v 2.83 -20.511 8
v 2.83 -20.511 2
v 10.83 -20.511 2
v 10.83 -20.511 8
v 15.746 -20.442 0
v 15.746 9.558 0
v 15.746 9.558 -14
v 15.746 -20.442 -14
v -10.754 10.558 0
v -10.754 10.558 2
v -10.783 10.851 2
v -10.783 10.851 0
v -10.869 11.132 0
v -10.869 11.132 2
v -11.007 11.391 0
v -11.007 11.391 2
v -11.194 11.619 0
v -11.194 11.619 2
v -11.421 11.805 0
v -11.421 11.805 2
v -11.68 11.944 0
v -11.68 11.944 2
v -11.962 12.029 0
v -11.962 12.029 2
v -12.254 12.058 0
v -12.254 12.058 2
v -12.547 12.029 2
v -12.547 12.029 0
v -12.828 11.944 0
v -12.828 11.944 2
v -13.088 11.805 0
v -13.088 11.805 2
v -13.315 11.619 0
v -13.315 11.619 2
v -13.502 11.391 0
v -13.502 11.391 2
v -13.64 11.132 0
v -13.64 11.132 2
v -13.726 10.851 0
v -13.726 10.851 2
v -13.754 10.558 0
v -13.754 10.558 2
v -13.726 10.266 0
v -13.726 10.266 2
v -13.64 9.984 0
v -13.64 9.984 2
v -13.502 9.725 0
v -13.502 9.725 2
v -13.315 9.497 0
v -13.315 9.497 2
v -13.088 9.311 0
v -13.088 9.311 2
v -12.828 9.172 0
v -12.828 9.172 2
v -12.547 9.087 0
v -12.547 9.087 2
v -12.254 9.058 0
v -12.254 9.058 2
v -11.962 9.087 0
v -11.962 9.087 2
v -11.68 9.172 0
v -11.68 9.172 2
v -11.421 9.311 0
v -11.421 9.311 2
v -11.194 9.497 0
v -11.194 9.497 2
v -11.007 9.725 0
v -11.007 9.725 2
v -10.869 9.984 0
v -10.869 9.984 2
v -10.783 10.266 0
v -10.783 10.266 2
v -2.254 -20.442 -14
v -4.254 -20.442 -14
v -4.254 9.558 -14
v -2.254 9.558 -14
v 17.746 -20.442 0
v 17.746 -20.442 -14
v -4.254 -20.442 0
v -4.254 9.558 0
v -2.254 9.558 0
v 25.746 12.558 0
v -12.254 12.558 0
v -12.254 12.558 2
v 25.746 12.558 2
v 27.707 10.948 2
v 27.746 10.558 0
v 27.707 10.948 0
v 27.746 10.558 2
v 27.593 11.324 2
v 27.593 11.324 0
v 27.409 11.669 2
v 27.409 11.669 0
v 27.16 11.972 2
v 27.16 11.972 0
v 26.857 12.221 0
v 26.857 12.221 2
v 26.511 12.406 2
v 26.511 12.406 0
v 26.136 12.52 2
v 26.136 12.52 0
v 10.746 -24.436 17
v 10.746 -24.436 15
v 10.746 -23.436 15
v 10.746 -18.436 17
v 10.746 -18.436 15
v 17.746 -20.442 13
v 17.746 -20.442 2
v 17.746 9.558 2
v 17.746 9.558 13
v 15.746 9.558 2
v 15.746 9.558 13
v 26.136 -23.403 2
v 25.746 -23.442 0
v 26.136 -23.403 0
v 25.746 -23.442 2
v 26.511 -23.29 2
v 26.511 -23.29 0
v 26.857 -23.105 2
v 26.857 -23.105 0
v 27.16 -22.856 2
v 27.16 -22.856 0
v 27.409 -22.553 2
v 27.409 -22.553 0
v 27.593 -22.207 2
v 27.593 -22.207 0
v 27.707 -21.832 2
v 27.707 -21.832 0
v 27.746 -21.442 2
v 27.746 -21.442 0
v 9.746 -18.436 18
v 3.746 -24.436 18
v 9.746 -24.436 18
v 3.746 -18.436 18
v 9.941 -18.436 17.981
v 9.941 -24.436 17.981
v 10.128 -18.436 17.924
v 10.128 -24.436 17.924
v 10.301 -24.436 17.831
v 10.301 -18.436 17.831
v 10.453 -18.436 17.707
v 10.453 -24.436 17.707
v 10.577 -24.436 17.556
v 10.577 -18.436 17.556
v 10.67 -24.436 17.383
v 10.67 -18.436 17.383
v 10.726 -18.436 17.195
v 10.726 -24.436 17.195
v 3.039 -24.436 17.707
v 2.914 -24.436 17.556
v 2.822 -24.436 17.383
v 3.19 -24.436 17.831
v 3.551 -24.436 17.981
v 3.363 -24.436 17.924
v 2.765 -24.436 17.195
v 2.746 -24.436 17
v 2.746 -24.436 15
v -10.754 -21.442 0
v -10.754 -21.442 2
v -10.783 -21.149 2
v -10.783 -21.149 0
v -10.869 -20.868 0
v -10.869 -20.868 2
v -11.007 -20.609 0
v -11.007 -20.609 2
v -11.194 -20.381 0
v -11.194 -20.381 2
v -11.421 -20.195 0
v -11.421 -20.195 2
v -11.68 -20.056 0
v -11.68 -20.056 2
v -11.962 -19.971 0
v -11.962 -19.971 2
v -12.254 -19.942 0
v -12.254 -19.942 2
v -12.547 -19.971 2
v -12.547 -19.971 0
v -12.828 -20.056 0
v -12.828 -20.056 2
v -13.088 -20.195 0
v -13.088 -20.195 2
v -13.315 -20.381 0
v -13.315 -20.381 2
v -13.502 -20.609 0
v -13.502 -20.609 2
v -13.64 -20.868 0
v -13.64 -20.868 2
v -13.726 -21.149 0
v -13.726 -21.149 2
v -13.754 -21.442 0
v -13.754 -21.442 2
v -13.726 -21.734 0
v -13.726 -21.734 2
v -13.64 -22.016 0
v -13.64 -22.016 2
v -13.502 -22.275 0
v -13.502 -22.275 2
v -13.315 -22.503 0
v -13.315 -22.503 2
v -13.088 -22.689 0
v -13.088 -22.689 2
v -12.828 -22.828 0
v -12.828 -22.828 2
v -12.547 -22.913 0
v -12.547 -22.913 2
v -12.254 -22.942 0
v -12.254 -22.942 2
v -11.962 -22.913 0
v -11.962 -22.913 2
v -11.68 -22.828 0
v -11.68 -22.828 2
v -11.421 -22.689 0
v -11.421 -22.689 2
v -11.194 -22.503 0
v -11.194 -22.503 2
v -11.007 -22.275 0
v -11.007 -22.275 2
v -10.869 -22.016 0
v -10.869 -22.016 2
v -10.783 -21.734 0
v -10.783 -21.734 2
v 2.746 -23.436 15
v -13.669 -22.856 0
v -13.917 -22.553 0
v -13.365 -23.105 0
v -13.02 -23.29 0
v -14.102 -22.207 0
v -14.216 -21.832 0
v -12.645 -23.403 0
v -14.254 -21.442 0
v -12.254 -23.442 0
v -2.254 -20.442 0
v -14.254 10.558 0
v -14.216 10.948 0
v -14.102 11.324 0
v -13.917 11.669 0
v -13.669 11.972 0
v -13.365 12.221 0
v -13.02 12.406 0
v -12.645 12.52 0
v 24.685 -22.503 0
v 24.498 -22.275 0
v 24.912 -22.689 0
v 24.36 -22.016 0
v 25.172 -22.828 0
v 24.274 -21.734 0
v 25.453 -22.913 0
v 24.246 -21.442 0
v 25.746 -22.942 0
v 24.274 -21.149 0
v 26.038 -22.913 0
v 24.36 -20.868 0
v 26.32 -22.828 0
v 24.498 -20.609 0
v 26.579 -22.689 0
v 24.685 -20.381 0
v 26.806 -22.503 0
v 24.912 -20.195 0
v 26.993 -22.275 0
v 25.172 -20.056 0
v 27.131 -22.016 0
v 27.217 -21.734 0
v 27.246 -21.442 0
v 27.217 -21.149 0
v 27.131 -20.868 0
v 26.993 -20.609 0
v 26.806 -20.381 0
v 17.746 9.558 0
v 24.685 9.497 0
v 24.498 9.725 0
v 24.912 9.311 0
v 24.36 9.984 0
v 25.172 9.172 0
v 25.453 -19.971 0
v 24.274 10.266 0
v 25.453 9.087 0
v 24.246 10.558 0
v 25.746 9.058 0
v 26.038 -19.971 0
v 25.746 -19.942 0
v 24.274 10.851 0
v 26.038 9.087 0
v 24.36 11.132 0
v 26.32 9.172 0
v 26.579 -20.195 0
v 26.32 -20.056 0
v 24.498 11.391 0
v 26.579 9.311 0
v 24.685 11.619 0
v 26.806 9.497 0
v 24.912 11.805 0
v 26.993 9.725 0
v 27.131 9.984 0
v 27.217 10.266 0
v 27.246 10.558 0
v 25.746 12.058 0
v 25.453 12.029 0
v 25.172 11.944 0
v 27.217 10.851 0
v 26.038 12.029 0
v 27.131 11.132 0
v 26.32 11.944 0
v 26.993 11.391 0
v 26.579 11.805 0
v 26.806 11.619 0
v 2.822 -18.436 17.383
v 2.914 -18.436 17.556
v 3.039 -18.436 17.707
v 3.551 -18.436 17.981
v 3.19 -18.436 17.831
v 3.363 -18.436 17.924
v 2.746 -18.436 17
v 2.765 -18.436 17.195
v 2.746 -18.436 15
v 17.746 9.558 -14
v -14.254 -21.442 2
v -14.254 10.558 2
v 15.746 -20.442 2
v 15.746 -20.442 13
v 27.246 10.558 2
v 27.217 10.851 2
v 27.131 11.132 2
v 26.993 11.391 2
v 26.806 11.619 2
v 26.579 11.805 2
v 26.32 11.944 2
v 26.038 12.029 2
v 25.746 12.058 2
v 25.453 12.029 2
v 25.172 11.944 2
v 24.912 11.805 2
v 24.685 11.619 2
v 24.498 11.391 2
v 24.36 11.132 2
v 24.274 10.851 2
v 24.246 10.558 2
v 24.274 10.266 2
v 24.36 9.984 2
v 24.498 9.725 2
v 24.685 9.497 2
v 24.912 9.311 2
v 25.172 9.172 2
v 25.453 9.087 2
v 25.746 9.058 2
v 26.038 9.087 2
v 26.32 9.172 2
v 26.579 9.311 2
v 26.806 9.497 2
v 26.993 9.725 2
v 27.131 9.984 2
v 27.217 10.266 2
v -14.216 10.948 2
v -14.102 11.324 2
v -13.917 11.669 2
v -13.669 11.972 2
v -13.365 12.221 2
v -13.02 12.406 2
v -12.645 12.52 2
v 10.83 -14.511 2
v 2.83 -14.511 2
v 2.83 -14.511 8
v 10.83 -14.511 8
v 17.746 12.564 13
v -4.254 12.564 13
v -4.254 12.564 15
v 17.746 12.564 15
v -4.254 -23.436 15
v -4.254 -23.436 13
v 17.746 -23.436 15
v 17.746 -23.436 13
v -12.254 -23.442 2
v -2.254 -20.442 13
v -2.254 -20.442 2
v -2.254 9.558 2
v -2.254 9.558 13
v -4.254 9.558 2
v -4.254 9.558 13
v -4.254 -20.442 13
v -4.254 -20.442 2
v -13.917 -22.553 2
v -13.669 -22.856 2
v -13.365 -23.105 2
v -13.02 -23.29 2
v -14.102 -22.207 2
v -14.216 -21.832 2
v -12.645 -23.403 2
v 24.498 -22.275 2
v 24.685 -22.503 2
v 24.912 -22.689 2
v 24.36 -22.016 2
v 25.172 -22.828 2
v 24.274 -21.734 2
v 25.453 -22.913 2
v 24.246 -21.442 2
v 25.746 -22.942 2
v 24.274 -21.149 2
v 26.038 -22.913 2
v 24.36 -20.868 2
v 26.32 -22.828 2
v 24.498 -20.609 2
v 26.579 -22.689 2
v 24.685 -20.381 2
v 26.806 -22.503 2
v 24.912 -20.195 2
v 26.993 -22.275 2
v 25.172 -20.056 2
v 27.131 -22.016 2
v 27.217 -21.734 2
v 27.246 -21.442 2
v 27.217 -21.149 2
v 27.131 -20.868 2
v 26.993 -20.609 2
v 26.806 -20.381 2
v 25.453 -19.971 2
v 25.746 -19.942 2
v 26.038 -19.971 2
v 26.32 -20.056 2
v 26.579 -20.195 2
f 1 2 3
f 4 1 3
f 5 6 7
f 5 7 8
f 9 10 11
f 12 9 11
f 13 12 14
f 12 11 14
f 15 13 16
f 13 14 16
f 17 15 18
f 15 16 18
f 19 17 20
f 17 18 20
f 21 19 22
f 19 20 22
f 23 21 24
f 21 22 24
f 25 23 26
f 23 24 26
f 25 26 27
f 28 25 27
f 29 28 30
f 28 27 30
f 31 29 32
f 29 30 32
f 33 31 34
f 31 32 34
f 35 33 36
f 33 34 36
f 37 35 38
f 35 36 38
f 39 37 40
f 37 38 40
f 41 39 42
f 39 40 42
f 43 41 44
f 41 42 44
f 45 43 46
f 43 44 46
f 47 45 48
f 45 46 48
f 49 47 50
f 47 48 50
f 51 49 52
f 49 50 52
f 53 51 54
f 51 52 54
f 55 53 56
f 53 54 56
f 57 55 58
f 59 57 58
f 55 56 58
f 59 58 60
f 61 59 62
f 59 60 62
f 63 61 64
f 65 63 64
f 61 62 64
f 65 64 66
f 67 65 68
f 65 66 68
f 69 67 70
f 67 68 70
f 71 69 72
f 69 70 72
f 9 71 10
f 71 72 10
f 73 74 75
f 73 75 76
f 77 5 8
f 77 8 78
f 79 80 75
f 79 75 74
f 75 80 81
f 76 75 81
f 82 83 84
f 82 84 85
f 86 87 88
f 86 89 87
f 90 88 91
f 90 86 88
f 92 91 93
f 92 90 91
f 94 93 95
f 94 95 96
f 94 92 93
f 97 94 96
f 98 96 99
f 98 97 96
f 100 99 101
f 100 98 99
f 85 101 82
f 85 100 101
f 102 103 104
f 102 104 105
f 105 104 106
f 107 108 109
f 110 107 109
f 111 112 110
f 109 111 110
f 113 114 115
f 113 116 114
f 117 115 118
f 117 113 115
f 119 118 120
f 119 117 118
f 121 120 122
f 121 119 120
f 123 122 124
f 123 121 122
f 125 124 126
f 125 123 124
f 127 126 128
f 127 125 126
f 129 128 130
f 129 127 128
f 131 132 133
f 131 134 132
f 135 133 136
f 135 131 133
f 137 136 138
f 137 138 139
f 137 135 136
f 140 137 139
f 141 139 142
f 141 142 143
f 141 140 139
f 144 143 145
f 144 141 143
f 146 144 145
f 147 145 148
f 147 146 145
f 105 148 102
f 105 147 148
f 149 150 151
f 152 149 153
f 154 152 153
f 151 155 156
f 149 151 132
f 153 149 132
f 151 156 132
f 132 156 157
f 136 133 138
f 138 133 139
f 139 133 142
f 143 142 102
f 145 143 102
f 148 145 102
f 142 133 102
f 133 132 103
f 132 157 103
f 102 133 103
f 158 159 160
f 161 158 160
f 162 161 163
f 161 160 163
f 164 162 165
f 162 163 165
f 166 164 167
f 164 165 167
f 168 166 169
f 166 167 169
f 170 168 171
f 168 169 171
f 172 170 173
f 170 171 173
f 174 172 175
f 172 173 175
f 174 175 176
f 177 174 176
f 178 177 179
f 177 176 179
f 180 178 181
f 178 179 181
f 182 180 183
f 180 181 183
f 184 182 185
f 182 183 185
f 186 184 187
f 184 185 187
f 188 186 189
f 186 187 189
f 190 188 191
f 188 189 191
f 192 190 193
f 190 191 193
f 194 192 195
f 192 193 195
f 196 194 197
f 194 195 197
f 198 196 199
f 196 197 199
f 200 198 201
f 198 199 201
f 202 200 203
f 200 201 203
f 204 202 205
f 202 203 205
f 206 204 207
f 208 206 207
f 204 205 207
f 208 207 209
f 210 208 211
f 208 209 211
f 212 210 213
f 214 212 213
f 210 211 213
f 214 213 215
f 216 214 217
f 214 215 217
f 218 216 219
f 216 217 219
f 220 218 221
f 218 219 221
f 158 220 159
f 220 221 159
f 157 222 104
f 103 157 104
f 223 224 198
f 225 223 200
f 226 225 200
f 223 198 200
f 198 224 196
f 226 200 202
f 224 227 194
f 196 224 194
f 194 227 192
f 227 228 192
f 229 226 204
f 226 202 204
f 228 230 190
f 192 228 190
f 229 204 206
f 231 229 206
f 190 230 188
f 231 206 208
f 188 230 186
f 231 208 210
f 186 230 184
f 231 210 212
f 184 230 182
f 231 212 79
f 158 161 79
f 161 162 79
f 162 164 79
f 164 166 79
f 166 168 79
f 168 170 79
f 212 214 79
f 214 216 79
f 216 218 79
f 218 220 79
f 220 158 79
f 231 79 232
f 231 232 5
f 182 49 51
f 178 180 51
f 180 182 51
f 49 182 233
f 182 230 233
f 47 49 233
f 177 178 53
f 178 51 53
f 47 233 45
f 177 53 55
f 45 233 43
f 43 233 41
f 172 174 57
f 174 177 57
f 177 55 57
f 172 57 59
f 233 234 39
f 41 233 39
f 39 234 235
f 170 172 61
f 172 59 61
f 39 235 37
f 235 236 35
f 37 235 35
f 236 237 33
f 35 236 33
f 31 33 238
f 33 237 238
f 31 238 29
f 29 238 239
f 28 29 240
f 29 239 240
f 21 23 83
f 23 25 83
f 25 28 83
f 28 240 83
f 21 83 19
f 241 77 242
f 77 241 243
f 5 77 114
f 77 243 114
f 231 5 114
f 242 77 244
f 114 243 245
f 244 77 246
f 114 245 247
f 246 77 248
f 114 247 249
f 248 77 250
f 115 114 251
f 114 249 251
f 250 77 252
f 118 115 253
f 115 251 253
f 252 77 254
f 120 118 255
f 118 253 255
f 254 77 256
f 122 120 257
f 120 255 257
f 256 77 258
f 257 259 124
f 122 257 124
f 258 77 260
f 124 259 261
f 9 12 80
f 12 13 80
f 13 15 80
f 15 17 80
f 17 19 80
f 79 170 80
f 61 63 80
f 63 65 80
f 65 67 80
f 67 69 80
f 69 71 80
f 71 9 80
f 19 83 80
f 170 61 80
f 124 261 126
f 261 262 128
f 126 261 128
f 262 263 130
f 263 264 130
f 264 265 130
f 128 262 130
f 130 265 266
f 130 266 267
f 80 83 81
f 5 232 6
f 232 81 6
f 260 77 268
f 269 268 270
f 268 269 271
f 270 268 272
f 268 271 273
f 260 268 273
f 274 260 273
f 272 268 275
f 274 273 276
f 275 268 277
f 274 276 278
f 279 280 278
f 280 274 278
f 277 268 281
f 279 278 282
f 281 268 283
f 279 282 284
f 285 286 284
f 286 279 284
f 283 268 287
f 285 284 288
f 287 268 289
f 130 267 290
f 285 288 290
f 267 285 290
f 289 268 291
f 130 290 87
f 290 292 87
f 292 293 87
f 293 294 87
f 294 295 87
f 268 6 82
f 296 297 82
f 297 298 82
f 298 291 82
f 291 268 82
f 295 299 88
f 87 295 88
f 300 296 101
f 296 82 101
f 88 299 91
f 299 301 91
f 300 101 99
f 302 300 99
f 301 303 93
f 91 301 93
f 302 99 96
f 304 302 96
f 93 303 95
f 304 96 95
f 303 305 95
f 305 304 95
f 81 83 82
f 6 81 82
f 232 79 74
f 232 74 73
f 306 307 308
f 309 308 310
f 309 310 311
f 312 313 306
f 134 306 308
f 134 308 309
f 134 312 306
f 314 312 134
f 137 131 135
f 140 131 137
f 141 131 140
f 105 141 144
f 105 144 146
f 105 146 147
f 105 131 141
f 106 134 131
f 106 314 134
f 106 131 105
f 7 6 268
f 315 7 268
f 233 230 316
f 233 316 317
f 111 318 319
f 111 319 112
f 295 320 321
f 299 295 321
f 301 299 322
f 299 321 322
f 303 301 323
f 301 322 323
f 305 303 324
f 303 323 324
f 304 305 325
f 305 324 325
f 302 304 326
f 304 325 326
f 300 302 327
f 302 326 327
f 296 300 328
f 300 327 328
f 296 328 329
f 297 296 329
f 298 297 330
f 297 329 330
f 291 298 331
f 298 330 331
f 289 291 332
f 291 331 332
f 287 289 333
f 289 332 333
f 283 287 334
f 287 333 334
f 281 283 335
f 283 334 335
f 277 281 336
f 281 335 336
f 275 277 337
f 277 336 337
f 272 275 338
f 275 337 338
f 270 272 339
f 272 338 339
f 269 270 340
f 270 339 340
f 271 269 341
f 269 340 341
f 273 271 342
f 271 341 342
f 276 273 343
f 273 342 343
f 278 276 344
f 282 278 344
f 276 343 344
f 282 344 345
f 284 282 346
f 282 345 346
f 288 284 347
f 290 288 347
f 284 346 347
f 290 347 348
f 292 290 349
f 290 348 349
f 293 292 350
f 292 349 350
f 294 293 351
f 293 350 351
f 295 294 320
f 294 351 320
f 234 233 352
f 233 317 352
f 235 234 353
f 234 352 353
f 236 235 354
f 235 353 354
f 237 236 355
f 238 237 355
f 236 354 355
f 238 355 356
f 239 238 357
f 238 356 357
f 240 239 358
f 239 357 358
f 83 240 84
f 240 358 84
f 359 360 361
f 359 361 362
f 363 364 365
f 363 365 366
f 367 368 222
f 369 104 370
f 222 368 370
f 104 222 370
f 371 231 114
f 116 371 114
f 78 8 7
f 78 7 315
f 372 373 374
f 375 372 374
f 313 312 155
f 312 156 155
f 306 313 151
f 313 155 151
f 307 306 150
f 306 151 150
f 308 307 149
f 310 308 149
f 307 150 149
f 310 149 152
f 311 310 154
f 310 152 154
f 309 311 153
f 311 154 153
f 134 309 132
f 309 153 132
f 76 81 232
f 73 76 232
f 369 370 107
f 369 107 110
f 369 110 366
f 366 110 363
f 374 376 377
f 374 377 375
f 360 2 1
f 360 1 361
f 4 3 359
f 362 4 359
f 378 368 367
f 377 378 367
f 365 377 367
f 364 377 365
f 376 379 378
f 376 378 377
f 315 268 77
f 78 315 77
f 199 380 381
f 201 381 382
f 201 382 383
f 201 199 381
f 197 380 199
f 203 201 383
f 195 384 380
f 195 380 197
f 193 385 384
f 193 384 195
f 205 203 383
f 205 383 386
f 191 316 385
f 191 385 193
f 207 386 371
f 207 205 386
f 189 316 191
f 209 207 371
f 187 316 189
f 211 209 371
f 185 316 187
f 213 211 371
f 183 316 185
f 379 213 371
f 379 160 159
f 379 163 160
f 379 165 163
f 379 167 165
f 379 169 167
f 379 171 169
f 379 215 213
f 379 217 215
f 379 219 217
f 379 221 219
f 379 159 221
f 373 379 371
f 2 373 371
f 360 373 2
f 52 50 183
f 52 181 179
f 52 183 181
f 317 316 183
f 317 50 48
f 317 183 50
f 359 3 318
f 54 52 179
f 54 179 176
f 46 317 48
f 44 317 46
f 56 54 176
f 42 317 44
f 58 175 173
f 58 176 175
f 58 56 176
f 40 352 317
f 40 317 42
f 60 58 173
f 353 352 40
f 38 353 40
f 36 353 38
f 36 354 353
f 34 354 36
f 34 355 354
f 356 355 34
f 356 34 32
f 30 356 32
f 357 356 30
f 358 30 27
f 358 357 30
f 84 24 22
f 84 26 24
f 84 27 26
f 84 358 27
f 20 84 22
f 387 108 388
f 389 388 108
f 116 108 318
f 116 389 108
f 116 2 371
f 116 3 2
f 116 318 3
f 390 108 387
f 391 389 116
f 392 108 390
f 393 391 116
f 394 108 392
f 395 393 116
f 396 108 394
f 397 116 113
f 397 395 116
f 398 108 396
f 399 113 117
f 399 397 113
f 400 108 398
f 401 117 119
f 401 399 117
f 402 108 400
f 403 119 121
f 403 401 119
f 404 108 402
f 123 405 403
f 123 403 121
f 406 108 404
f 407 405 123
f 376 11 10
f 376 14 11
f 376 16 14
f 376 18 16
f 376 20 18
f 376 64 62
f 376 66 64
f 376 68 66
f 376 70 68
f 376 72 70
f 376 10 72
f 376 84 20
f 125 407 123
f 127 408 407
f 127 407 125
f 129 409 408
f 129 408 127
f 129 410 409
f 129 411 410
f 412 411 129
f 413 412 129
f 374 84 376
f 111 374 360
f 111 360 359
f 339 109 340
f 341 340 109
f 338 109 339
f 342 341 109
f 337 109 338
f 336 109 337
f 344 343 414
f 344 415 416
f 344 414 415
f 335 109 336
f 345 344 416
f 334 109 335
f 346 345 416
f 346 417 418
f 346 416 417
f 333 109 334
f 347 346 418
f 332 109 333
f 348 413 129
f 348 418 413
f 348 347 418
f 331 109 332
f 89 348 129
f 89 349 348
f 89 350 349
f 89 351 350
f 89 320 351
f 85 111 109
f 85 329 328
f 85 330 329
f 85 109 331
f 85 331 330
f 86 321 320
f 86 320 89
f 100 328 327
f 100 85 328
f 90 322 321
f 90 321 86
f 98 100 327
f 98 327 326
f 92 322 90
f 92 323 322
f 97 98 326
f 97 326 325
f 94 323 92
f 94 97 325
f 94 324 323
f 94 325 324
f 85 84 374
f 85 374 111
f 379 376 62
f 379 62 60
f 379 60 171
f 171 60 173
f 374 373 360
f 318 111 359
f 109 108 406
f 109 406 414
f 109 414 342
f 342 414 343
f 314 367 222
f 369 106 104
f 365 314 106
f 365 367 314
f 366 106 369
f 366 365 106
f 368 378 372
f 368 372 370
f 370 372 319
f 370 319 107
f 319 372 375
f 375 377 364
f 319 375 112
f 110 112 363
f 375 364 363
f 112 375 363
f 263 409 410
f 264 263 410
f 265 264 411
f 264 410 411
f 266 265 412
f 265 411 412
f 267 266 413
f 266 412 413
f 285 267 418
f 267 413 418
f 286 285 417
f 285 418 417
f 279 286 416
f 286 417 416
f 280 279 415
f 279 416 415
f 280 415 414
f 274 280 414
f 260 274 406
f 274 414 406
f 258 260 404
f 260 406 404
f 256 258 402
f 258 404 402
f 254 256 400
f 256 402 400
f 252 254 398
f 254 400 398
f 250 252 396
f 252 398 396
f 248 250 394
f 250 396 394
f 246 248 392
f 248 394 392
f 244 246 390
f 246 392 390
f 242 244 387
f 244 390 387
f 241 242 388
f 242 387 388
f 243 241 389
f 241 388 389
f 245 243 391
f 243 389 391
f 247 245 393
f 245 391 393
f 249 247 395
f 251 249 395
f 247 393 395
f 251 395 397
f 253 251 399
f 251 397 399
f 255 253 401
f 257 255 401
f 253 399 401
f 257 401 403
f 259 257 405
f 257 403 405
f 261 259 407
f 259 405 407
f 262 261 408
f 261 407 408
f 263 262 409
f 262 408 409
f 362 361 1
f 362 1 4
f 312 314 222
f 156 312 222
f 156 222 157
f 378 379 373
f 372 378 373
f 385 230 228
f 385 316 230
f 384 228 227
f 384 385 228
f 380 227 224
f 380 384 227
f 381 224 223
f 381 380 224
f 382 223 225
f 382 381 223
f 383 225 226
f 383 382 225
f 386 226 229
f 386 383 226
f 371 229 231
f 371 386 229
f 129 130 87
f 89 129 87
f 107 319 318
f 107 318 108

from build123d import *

# Parameters (mm, degrees)
F0_W      = 42
F0_H      = 36
F1_DEPTH  = 2
F2_R      = 2
F3_R      = 1.5
F4_DEPTH  = 2
F5_W      = 2
F5_H      = 30
F6_DEPTH  = 14
F7_W      = 2
F7_H      = 30
F8_DEPTH  = 11
F9_W      = 22
F9_H      = 36
F10_DEPTH = 2
F11_W     = 8
F11_H     = 4.9999979734
F11_H_2   = 1.0000020266
F12_DEPTH = 3
F13_R     = 1
F7_W_2    = 8
F7_H_2    = 6
F14_DEPTH = 6


# Not quite as in the source:
# - a feature names something its author has since deleted; it is built from what else it names


with BuildPart() as f1:
    # F0 (on Top) → F1 (new body)
    with BuildSketch(Plane.XY):
        with Locations((6.745641768, -5.4418604523)):
            Rectangle(F0_W, F0_H)
    extrude(amount=F1_DEPTH)

    # F2
    f2_edges = [f1.edges().sort_by_distance(p)[0] for p in [
        (27.745642, -23.44186, 1),
        (27.745642, 12.55814, 1),
        (-14.254358, -23.44186, 1),
        (-14.254358, 12.55814, 1),
    ]]
    fillet(f2_edges, radius=F2_R)

    # F3 (on face) → F4 (cut)
    with BuildSketch(Plane.XY.offset(2)):
        with Locations((-12.254358232, 10.5581395477)):
            Circle(F3_R)
        with Locations((-12.254358232, -21.4418604523)):
            Circle(F3_R)
        with Locations((25.745641768, -21.4418604523)):
            Circle(F3_R)
        with Locations((25.745641768, 10.5581395477)):
            Circle(F3_R)
    extrude(amount=-F4_DEPTH, mode=Mode.SUBTRACT)

    # F5 (on face) → F6 (join)
    with BuildSketch(Plane(origin=(0, 0, 0), x_dir=(1, 0, 0), z_dir=(0, 0, -1))):
        with Locations((16.7456435263, 5.4418606311)):
            Rectangle(F5_W, F5_H)
        with Locations((-3.2543599904, 5.4418606311)):
            Rectangle(F5_W, F5_H)
    extrude(amount=F6_DEPTH)

    # F7 (on face) → F8 (join)
    with BuildSketch(Plane.XY.offset(2)):
        with Locations((16.7456435263, -5.4418606311)):
            Rectangle(F7_W, F7_H)
        with Locations((-3.2543599904, -5.4418606311)):
            Rectangle(F7_W, F7_H)
    extrude(amount=F8_DEPTH)

    # F9 (on face) → F10 (join)
    with BuildSketch(Plane.XY.offset(13)):
        with Locations((6.7456400096, -5.4360154718)):
            Rectangle(F9_W, F9_H)
    extrude(amount=F10_DEPTH)

    # F11 (on face) → F12 (join)
    with BuildSketch(Plane.XY.offset(15)):
        with Locations((6.7456399985, -20.9360164851)):
            Rectangle(F11_W, F11_H)
        with Locations((6.7456399985, -23.9360164851)):
            Rectangle(F11_W, F11_H_2)
    extrude(amount=F12_DEPTH)

    # F13
    f13_edges = [f1.edges().sort_by_distance(p)[0] for p in [
        (10.74564, -21.436017, 18),
        (2.74564, -21.436017, 18),
    ]]
    fillet(f13_edges, radius=F13_R)

    # F7 (on face) → F14 (join)
    with BuildSketch(Plane.XY.offset(2)):
        with Locations((6.829907462, -17.511118643)):
            Rectangle(F7_W_2, F7_H_2)
    extrude(amount=F14_DEPTH)


with BuildPart() as f15_1:
    # F15: copy of F1
    add(f1.part)


solid = f1.part
